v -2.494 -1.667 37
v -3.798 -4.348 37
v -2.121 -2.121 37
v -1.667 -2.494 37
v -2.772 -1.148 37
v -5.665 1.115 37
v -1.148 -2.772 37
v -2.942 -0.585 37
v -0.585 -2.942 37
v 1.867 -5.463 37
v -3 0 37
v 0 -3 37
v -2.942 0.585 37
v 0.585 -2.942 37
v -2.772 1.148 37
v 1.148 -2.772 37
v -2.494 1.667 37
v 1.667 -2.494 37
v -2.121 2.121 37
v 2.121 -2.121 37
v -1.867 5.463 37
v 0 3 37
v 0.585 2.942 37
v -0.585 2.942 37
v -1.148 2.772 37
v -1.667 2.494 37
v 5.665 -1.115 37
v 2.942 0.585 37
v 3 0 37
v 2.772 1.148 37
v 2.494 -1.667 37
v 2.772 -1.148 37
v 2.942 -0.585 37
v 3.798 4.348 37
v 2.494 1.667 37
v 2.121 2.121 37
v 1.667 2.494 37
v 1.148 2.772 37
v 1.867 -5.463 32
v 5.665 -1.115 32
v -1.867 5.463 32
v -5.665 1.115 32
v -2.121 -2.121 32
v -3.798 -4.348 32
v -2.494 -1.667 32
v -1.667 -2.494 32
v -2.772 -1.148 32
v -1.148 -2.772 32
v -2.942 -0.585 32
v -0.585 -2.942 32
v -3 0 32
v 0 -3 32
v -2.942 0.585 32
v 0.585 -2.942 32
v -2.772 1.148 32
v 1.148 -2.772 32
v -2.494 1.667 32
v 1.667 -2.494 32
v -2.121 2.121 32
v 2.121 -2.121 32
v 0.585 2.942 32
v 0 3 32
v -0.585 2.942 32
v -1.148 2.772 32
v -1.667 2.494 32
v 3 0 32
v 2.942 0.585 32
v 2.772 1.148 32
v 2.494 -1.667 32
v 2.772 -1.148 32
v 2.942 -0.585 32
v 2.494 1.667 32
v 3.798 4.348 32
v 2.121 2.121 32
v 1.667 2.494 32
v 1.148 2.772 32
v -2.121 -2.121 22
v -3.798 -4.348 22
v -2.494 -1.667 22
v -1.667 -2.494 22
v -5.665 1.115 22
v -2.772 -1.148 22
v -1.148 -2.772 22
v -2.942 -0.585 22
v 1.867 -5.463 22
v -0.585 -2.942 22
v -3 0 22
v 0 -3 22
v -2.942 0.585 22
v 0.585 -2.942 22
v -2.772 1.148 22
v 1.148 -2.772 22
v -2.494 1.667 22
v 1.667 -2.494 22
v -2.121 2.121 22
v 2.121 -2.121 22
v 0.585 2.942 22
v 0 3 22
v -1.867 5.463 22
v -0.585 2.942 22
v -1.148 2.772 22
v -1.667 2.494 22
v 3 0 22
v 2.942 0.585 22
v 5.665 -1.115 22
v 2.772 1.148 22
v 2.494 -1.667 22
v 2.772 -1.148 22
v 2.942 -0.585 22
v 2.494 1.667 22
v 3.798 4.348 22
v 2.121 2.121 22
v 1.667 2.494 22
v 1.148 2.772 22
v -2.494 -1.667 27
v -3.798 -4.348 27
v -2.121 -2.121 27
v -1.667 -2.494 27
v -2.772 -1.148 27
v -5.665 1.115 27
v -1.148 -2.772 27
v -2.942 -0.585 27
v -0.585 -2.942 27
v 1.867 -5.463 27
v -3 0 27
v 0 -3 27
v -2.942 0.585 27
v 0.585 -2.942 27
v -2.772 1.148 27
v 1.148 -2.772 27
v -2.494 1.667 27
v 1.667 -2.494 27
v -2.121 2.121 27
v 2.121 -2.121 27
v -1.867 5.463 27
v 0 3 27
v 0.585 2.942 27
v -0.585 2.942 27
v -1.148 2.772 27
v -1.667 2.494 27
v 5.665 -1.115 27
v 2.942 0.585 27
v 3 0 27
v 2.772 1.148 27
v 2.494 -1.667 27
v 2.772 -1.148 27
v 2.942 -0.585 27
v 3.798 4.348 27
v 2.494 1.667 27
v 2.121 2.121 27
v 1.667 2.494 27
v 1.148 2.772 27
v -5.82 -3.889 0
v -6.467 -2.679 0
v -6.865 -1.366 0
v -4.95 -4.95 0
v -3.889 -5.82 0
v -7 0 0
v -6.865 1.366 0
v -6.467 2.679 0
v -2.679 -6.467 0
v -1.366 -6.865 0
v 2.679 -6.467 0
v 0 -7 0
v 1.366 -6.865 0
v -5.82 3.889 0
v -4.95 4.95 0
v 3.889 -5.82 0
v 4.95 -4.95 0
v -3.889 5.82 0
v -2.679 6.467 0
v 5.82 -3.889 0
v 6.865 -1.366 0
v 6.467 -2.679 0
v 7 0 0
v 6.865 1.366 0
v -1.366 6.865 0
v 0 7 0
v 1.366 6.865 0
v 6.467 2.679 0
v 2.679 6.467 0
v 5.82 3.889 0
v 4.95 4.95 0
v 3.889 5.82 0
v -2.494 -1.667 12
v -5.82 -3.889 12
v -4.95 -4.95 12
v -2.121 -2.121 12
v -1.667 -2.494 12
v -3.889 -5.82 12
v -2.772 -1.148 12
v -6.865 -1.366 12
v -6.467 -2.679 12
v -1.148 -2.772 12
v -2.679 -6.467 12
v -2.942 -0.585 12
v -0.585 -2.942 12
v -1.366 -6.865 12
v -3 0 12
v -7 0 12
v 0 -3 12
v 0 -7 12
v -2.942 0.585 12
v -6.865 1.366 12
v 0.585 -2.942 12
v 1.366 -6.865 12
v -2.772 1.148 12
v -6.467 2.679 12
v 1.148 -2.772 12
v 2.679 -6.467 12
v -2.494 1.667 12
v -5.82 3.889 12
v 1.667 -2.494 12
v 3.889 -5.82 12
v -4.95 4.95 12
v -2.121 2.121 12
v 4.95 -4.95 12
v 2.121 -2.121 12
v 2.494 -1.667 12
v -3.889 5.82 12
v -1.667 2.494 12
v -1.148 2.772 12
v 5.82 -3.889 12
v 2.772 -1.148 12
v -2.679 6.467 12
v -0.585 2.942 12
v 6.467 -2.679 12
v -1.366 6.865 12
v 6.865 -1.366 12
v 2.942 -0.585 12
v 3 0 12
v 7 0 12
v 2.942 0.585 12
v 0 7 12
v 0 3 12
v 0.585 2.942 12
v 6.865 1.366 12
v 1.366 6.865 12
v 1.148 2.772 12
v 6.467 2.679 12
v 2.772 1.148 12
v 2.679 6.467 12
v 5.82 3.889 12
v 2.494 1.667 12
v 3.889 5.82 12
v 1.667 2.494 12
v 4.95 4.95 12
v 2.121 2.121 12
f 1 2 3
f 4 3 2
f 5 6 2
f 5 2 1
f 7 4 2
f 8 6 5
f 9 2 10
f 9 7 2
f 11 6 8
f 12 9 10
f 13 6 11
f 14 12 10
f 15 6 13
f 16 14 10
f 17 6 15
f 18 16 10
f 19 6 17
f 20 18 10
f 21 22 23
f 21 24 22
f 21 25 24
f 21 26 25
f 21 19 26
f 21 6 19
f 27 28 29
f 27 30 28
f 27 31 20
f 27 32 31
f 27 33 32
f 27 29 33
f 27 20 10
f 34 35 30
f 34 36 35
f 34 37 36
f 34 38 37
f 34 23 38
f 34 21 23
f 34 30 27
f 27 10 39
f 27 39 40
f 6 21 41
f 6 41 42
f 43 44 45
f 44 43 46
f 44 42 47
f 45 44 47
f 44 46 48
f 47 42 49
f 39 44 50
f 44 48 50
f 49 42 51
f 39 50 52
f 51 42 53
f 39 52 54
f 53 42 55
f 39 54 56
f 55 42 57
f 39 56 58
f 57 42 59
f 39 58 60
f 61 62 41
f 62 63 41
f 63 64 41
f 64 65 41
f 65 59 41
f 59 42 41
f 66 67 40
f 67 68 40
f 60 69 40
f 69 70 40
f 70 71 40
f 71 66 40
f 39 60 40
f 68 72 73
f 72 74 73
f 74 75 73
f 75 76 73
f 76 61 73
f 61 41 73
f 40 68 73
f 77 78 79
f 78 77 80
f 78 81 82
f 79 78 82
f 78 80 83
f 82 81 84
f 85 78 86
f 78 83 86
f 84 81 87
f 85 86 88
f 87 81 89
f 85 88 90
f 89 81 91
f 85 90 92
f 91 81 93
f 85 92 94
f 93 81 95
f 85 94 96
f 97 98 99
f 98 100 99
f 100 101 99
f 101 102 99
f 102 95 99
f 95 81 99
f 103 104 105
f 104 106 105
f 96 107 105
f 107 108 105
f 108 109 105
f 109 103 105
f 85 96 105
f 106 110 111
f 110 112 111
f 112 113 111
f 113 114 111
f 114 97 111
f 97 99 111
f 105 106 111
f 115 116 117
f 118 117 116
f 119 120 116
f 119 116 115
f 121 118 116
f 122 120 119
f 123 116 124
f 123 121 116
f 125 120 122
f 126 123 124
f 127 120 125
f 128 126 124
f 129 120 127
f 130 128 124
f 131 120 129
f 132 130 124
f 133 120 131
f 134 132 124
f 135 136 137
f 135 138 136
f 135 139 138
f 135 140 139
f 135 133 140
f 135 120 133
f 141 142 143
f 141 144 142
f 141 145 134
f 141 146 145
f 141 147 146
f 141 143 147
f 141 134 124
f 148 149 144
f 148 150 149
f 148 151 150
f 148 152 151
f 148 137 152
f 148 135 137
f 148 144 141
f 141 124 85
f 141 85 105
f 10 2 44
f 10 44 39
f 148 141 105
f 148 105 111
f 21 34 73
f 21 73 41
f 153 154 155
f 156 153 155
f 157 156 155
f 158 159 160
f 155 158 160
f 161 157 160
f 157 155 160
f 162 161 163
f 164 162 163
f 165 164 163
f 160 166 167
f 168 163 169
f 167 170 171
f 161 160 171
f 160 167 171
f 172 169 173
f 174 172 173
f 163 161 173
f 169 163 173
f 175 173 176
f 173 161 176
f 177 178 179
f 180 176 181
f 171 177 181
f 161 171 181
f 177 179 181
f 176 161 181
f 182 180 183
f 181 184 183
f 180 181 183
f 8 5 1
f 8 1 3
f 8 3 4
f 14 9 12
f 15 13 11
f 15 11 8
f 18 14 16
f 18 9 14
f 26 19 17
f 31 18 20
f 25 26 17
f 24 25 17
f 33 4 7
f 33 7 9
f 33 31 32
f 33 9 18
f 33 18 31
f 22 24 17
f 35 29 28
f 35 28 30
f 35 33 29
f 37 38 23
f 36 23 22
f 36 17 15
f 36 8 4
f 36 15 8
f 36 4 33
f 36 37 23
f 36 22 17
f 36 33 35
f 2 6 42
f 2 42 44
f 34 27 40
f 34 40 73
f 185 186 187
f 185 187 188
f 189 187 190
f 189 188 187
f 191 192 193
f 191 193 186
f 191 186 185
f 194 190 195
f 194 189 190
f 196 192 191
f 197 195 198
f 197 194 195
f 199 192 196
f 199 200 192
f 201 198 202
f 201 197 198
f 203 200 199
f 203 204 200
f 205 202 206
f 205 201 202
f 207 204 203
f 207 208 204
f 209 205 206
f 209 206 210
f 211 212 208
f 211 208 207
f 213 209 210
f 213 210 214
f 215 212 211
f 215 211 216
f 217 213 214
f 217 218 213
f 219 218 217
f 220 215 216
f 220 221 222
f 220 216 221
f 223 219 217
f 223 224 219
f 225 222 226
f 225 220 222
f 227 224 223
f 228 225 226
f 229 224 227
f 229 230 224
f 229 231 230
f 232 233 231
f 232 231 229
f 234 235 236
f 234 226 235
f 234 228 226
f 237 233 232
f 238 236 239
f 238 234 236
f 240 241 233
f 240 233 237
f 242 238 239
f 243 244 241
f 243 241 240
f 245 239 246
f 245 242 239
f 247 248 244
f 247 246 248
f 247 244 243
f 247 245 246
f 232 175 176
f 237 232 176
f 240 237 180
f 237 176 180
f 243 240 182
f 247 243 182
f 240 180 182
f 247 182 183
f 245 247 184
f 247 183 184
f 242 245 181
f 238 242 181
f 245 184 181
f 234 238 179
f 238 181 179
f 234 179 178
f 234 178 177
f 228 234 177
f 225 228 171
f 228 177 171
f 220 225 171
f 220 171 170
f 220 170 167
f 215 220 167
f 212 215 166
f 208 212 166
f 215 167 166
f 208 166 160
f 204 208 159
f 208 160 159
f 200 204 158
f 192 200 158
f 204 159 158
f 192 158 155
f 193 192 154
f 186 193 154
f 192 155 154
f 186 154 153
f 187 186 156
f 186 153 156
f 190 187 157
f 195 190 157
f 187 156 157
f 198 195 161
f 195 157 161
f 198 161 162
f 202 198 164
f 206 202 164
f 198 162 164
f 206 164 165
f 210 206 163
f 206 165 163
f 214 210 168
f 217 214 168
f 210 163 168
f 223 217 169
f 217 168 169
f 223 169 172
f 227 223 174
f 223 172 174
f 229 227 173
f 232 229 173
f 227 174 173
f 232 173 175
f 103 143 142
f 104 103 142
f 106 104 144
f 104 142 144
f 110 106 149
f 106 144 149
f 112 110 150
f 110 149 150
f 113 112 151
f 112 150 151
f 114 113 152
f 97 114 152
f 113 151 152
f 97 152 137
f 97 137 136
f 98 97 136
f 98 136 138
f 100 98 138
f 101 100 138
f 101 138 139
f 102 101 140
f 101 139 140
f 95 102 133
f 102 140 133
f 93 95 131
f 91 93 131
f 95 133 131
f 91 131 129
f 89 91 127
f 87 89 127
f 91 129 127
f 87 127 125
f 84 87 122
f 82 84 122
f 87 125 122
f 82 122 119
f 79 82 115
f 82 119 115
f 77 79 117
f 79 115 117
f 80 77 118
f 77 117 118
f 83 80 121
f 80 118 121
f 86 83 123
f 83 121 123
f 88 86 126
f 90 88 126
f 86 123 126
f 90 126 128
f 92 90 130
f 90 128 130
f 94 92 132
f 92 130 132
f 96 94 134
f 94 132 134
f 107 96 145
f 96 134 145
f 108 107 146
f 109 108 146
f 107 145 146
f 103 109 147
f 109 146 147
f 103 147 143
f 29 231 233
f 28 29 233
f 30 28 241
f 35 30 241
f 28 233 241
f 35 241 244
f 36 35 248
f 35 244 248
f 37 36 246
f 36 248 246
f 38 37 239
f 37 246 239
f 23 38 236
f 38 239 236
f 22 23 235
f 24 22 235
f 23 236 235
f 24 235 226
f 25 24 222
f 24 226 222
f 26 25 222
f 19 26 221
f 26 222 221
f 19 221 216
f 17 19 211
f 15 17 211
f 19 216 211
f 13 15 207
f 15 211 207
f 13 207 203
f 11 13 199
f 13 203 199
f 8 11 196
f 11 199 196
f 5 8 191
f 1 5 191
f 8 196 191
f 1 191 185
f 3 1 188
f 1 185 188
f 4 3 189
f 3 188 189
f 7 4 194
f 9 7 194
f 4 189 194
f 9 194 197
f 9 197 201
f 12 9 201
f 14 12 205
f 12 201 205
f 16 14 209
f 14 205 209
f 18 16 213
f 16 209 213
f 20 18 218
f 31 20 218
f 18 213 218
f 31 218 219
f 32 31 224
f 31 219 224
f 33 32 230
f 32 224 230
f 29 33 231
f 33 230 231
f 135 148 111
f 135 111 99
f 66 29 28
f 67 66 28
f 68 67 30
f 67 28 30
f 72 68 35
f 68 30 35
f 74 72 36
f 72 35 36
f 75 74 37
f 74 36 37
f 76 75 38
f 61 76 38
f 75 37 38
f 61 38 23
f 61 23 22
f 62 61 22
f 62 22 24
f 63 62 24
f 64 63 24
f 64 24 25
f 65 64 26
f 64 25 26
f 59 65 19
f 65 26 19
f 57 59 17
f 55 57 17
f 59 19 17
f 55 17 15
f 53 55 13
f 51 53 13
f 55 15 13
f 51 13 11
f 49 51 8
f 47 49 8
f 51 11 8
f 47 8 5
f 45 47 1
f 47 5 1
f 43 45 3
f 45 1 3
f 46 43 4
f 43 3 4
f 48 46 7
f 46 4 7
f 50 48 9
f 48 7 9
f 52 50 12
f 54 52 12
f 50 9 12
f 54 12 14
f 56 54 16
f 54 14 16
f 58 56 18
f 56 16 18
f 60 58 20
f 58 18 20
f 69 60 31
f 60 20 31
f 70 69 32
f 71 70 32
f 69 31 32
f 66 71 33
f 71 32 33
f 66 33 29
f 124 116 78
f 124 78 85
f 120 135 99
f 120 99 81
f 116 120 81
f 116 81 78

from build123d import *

# Parameters (mm, degrees)
SKETCH_1_R             = 7
EXTRUDE_1_DEPTH        = 12
SKETCH_2_R             = 3
EXTRUDE_2_DEPTH        = 25
SKETCH_3_R             = 3
EXTRUDE_3_DEPTH        = 5
PATTERN_LINEAR_1_COUNT = 2
PATTERN_LINEAR_1_PITCH = 10


with BuildPart() as part:
    # 草图1 → 凸台-拉伸1 (new body)
    with BuildSketch(Plane.XY):
        Circle(SKETCH_1_R)
    extrude(amount=EXTRUDE_1_DEPTH)

    # 草图2 → 凸台-拉伸2 (add)
    with BuildSketch(Plane.XY.offset(12)):
        Circle(SKETCH_2_R)
    extrude(amount=EXTRUDE_2_DEPTH)


with BuildPart() as body_2:
    # 草图3 → 凸台-拉伸3 (new body)
    with BuildSketch(Plane.XY.offset(37)):
        Polygon((3.798234894, 4.348188706), (-1.866524433, 5.463462261), (-5.664759327, 1.115273555), (-3.798234894, -4.348188706), (1.866524433, -5.463462261), (5.664759327, -1.115273555), align=None)
        Circle(SKETCH_3_R, mode=Mode.SUBTRACT)
    extrude(amount=-EXTRUDE_3_DEPTH)


with BuildPart() as pattern_linear_1_1:
    # 阵列(线性)1: pattern copy
    add(body_2.part.moved(Location(Vector(0, 0, -1) * (1 * PATTERN_LINEAR_1_PITCH))))


solid = Compound([part.part, body_2.part, pattern_linear_1_1.part])
